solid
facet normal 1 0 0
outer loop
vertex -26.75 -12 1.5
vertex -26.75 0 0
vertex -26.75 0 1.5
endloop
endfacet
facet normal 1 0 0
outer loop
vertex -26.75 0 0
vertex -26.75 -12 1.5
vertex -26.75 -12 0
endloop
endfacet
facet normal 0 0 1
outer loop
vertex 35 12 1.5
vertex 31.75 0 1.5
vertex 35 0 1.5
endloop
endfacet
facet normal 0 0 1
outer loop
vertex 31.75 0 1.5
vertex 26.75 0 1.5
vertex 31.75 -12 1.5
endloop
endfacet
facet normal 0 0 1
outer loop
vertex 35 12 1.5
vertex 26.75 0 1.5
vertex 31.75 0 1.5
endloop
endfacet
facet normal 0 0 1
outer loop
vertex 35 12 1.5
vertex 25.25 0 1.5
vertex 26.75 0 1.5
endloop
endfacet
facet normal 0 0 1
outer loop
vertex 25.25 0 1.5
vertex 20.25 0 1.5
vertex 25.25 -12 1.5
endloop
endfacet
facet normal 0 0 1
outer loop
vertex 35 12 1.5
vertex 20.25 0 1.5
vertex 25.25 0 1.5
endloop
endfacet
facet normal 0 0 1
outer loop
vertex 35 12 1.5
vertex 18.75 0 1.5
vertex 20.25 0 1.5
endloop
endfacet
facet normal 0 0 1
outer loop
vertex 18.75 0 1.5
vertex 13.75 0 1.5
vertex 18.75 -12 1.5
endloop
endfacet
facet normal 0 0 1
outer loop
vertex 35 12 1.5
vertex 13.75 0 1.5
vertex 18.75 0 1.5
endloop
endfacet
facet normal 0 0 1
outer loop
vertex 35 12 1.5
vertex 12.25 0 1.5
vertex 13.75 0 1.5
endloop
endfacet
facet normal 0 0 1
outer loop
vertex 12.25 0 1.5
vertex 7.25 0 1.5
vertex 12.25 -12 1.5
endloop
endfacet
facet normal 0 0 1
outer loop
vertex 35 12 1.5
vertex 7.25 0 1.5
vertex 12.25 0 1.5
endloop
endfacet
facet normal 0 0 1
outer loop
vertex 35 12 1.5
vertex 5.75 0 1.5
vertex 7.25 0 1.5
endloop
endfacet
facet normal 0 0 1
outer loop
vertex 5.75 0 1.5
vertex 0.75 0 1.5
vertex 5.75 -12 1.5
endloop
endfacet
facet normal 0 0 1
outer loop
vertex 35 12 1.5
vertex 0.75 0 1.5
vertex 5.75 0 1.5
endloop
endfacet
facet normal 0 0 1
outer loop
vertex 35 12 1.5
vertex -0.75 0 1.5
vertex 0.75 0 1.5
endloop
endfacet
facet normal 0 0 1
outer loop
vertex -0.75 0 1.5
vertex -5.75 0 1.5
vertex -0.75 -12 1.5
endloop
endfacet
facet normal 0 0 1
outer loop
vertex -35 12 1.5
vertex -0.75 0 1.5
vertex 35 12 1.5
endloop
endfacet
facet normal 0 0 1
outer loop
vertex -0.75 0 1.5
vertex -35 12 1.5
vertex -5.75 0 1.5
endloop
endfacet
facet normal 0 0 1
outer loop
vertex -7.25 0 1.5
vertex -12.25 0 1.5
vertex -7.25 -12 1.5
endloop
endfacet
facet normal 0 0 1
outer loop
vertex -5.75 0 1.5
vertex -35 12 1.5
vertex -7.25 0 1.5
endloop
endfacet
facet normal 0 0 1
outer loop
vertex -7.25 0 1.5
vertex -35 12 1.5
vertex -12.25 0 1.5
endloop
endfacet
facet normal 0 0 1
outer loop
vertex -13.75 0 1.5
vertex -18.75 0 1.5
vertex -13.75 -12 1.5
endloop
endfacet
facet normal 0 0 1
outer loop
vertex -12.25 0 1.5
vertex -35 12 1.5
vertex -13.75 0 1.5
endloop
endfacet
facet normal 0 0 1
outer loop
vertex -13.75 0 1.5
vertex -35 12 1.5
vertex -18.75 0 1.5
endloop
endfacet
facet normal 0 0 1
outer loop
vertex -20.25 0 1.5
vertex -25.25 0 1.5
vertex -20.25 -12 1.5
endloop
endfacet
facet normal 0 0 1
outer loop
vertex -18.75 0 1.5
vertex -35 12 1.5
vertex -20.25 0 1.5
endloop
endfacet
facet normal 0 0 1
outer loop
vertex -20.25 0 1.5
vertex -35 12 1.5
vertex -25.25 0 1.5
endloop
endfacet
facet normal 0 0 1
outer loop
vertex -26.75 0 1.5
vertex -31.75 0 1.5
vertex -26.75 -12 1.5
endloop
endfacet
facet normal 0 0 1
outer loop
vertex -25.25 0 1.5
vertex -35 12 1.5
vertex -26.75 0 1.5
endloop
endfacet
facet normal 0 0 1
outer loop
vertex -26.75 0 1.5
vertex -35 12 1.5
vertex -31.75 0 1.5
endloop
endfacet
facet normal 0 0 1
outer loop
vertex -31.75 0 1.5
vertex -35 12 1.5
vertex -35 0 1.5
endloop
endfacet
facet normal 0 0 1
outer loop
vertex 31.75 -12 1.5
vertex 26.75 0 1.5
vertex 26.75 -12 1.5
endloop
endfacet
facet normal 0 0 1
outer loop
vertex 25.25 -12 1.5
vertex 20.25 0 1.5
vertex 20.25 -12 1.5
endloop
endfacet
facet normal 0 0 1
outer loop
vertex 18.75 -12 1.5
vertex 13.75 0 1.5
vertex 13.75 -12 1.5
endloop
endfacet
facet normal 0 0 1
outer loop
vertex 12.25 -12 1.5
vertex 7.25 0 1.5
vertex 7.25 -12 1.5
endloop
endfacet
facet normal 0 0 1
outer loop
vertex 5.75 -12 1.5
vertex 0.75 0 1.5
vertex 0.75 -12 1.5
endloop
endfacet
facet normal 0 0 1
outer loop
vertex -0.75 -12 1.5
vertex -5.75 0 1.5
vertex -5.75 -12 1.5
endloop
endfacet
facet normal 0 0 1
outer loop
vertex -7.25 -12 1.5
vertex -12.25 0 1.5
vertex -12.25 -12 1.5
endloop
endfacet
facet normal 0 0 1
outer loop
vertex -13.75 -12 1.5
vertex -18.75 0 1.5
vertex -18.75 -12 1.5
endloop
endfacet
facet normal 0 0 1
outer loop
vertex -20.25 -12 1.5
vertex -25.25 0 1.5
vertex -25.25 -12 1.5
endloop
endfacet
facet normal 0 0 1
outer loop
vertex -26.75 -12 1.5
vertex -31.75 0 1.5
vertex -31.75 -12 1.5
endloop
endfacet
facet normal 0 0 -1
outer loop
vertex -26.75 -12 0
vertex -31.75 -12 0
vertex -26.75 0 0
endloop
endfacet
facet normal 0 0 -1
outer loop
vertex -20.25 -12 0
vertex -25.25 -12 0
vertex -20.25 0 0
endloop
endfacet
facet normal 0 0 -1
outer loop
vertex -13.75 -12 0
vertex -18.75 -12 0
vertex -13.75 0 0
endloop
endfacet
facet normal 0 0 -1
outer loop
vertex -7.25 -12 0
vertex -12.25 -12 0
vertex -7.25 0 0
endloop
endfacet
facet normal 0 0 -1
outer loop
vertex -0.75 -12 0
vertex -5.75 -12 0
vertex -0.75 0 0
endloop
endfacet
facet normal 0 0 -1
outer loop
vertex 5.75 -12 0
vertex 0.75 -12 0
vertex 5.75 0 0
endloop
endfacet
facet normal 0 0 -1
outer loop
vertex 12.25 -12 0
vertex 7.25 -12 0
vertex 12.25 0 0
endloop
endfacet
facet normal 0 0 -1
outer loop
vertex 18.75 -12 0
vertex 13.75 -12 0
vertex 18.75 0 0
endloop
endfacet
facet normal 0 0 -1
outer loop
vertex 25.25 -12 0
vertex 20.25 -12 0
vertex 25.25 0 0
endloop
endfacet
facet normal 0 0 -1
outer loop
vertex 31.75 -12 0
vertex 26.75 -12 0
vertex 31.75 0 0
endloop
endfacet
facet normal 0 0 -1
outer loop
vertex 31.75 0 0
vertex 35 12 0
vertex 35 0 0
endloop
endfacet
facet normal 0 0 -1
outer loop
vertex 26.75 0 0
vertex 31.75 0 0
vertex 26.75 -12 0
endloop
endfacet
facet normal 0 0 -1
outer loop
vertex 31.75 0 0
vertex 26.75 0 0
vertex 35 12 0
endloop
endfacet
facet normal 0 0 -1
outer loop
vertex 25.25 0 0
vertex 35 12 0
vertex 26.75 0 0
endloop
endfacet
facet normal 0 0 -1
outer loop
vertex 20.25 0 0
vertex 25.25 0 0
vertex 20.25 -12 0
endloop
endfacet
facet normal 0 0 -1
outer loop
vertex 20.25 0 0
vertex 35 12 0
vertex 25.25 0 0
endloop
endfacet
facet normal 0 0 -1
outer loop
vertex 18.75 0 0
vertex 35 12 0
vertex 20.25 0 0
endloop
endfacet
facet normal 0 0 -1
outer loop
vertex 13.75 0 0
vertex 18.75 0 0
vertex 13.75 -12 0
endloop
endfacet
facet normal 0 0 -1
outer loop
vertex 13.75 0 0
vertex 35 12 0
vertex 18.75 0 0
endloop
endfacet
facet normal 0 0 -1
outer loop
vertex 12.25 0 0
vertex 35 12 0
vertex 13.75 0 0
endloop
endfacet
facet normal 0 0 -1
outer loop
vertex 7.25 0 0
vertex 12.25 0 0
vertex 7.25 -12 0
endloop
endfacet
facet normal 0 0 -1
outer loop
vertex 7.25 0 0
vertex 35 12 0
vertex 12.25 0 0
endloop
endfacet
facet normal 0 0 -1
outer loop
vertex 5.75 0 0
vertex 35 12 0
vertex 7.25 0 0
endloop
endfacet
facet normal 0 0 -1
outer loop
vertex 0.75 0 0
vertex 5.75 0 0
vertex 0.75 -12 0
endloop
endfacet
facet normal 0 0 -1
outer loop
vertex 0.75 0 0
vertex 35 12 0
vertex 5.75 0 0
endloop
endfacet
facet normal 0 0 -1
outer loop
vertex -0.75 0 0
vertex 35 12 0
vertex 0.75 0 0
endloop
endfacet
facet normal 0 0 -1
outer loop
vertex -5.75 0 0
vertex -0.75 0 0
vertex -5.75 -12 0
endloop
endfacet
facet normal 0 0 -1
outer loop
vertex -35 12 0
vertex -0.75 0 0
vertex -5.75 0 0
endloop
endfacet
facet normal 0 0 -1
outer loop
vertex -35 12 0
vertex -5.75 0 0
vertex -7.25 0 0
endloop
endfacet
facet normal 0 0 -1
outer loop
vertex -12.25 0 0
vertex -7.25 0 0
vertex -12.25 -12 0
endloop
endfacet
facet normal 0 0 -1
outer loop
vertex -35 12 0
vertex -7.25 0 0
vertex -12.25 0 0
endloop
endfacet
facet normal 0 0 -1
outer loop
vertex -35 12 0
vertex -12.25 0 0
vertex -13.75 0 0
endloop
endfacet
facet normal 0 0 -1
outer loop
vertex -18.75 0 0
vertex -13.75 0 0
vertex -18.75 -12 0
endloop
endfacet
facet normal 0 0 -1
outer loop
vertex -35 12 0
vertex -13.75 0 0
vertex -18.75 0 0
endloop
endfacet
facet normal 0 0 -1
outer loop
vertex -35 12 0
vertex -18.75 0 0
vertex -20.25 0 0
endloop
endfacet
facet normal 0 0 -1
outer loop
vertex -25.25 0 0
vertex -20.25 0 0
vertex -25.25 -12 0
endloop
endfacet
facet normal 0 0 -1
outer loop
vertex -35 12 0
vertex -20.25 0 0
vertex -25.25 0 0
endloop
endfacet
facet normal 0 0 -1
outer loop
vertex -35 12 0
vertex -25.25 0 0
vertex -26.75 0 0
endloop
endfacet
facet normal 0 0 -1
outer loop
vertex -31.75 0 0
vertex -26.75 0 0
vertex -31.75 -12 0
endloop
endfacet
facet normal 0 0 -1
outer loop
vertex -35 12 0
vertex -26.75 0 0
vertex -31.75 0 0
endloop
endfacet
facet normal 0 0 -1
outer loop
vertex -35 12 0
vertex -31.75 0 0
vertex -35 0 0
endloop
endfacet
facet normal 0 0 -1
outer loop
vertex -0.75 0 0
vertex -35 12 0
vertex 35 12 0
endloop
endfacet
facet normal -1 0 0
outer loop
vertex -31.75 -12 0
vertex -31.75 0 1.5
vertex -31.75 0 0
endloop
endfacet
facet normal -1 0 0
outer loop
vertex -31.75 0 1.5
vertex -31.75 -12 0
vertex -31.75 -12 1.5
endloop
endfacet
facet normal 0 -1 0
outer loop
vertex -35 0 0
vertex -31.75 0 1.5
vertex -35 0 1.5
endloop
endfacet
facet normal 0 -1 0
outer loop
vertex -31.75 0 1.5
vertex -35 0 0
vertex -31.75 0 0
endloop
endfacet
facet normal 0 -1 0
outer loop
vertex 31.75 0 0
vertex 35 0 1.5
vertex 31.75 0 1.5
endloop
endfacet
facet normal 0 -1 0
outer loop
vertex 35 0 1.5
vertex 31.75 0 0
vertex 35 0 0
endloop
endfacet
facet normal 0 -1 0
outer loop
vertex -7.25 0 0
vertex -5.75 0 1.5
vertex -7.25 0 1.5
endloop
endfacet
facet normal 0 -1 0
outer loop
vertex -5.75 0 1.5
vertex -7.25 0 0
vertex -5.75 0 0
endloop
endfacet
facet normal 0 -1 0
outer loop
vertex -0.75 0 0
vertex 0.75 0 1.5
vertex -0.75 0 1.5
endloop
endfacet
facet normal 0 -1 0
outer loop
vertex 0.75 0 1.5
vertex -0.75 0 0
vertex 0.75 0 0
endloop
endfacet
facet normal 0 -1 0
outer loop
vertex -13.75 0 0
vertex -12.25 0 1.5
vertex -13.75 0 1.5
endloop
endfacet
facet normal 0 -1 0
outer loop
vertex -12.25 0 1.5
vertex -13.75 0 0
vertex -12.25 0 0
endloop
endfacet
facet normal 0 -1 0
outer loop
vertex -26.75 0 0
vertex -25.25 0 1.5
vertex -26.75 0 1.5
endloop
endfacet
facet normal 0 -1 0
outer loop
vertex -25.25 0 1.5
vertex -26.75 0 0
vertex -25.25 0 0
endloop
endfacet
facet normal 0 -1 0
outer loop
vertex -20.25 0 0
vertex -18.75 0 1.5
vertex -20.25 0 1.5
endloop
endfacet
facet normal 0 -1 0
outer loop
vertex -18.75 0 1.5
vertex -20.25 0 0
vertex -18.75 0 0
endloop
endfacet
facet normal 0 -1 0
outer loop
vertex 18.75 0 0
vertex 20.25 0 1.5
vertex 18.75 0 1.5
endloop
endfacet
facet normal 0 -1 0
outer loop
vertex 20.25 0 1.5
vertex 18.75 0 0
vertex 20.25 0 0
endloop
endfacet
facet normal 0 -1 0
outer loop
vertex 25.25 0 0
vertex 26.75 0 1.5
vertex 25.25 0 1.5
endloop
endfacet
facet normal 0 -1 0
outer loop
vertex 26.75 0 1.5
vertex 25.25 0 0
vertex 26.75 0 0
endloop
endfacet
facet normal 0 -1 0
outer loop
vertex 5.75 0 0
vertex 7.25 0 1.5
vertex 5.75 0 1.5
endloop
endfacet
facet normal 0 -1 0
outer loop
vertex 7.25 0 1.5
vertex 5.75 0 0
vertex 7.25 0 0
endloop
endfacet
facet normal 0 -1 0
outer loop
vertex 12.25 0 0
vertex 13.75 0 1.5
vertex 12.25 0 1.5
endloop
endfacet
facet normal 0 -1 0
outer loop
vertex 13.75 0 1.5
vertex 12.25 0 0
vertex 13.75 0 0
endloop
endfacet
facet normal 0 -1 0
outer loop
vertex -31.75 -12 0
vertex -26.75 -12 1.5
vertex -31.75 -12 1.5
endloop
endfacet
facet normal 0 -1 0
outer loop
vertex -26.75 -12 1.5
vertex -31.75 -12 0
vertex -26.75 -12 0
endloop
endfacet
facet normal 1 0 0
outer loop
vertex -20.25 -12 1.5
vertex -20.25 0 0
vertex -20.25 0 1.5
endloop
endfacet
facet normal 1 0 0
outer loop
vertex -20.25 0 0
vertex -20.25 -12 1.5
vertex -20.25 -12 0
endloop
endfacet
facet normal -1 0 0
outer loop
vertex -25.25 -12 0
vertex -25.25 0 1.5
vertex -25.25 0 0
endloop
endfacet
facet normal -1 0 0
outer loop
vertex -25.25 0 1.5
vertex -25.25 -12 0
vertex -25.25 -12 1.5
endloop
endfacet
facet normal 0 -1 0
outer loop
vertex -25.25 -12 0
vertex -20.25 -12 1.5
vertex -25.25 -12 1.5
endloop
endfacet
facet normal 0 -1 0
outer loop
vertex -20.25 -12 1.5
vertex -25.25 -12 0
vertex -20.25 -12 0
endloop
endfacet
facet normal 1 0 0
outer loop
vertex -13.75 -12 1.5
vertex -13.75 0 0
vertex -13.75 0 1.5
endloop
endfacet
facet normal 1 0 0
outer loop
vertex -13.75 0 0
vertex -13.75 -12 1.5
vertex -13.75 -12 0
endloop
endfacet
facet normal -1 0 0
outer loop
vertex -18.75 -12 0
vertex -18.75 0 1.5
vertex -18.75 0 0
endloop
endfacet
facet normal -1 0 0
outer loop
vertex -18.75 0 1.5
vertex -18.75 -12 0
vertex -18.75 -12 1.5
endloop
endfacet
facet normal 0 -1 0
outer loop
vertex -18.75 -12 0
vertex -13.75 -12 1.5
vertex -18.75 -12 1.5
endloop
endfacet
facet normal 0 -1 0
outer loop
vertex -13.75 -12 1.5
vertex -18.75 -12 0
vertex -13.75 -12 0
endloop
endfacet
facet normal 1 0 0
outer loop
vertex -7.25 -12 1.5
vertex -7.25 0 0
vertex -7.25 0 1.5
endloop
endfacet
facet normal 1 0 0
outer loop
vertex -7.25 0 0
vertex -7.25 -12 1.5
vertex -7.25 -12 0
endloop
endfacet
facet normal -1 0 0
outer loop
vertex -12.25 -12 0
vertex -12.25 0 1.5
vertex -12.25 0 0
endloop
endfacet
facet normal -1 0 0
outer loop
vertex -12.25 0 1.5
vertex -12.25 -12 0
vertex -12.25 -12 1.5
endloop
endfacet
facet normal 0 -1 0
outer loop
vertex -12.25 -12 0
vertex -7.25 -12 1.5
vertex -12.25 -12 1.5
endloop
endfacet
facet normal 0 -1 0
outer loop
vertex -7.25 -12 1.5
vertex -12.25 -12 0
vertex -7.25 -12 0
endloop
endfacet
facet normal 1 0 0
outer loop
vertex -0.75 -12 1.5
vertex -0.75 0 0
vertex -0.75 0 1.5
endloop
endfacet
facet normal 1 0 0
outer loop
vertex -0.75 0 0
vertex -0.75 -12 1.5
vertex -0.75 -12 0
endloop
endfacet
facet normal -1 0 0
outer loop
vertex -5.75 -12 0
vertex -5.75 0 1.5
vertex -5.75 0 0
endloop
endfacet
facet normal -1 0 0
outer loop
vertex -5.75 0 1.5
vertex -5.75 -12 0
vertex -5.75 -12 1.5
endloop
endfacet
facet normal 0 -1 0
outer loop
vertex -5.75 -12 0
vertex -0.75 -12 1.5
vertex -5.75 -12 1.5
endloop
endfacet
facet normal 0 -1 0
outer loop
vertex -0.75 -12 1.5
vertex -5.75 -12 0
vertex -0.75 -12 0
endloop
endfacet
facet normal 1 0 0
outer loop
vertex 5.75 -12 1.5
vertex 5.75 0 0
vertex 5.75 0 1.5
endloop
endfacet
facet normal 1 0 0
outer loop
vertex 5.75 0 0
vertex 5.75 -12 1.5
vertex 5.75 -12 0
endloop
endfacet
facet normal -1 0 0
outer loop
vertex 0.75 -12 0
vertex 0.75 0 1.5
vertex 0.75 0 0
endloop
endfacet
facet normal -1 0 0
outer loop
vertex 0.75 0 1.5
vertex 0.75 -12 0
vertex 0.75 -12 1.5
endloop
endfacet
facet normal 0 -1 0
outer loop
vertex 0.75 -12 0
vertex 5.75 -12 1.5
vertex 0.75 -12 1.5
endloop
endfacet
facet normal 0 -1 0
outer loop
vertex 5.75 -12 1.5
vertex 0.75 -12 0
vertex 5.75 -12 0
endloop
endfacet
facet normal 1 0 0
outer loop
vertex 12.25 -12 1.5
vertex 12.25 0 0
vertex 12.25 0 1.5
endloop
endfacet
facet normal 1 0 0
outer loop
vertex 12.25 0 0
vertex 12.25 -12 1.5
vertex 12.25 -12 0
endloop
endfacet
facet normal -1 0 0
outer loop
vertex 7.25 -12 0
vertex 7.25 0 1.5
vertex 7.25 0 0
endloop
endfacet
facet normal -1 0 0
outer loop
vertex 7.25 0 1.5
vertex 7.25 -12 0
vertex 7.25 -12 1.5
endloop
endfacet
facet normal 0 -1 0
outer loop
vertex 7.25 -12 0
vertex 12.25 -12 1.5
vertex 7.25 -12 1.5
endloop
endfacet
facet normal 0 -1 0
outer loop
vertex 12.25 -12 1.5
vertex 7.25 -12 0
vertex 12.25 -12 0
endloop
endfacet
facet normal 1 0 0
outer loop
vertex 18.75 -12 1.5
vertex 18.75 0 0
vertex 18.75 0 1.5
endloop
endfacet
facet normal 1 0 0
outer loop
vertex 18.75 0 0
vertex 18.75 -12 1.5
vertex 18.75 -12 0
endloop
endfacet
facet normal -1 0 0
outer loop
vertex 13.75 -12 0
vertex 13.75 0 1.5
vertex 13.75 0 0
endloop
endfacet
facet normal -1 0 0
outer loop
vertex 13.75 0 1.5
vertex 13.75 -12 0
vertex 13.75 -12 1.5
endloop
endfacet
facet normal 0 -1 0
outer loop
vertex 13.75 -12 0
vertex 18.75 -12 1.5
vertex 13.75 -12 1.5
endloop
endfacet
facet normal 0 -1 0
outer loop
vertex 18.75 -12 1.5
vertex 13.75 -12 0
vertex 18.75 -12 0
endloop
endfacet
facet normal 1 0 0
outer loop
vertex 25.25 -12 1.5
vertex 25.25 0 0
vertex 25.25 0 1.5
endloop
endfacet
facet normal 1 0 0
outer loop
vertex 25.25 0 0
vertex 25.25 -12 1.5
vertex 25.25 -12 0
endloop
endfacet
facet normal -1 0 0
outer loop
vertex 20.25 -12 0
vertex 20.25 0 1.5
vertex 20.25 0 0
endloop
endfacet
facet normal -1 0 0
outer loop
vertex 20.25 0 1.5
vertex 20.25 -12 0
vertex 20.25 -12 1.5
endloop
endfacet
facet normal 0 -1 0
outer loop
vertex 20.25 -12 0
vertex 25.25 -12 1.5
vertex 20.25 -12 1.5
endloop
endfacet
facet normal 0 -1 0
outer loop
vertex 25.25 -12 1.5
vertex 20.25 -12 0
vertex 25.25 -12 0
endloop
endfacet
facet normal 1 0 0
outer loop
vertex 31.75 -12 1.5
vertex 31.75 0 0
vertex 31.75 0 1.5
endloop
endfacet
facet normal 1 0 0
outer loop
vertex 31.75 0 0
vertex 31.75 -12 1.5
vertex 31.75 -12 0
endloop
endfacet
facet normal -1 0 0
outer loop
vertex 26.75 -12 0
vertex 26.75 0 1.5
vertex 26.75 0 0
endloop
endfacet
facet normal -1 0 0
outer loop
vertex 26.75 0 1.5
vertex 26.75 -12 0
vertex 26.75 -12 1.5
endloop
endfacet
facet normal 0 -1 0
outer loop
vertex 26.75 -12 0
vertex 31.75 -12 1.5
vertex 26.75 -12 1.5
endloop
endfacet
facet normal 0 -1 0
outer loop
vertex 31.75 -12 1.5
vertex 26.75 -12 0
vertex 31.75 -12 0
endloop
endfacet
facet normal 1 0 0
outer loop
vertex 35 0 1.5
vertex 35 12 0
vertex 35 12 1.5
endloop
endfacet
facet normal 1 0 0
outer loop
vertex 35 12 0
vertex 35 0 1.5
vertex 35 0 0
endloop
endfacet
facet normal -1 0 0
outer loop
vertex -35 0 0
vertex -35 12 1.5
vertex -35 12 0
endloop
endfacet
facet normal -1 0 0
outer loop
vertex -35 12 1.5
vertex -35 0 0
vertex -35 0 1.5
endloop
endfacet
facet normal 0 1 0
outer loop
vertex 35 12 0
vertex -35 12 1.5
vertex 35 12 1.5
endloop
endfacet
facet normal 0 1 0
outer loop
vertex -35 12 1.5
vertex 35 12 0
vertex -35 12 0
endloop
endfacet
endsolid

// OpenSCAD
// 10-well agarose gel comb, printed flat (Z = thickness)
// All dimensions in mm, measured with calipers.

// Global
$fn = 64;

// Spine (back bar)
spine_len   = 70;   // X length of the spine
spine_wid   = 12;   // Y width of the spine
plate_thick = 1.5;  // Z thickness of the whole comb

// Teeth
n_teeth     = 10;   // number of teeth
tooth_wid   = 5.0;  // X width of each tooth
tooth_len   = 12;   // Y length of each tooth (hangs in -Y from spine)
gap         = 1.5;  // X gap between neighbouring teeth

// Derived
tooth_pitch = tooth_wid + gap;                       // centre-to-centre X spacing
row_width   = (n_teeth - 1) * tooth_pitch + tooth_wid; // total X extent of the tooth row
row_start_x = -row_width / 2 + tooth_wid / 2;        // X of first tooth centre (row centred on origin)

// Spine occupies Y in [0, spine_wid]; teeth hang in -Y from Y = 0.
// (The comb is centred on the origin in X; Y is offset so the spine sits at Y >= 0.)

module comb() {
    // Spine
    translate([-spine_len/2, 0, 0])
        cube([spine_len, spine_wid, plate_thick], center=[true, false, false]);

    // Teeth (10 of them), each a 5 x 12 x 1.5 block hanging in -Y
    for (i = [0 : n_teeth - 1]) {
        tx = row_start_x + i * tooth_pitch;
        translate([tx - tooth_wid/2, -tooth_len, 0])
            cube([tooth_wid, tooth_len, plate_thick], center=[true, false, false]);
    }
}

comb();
